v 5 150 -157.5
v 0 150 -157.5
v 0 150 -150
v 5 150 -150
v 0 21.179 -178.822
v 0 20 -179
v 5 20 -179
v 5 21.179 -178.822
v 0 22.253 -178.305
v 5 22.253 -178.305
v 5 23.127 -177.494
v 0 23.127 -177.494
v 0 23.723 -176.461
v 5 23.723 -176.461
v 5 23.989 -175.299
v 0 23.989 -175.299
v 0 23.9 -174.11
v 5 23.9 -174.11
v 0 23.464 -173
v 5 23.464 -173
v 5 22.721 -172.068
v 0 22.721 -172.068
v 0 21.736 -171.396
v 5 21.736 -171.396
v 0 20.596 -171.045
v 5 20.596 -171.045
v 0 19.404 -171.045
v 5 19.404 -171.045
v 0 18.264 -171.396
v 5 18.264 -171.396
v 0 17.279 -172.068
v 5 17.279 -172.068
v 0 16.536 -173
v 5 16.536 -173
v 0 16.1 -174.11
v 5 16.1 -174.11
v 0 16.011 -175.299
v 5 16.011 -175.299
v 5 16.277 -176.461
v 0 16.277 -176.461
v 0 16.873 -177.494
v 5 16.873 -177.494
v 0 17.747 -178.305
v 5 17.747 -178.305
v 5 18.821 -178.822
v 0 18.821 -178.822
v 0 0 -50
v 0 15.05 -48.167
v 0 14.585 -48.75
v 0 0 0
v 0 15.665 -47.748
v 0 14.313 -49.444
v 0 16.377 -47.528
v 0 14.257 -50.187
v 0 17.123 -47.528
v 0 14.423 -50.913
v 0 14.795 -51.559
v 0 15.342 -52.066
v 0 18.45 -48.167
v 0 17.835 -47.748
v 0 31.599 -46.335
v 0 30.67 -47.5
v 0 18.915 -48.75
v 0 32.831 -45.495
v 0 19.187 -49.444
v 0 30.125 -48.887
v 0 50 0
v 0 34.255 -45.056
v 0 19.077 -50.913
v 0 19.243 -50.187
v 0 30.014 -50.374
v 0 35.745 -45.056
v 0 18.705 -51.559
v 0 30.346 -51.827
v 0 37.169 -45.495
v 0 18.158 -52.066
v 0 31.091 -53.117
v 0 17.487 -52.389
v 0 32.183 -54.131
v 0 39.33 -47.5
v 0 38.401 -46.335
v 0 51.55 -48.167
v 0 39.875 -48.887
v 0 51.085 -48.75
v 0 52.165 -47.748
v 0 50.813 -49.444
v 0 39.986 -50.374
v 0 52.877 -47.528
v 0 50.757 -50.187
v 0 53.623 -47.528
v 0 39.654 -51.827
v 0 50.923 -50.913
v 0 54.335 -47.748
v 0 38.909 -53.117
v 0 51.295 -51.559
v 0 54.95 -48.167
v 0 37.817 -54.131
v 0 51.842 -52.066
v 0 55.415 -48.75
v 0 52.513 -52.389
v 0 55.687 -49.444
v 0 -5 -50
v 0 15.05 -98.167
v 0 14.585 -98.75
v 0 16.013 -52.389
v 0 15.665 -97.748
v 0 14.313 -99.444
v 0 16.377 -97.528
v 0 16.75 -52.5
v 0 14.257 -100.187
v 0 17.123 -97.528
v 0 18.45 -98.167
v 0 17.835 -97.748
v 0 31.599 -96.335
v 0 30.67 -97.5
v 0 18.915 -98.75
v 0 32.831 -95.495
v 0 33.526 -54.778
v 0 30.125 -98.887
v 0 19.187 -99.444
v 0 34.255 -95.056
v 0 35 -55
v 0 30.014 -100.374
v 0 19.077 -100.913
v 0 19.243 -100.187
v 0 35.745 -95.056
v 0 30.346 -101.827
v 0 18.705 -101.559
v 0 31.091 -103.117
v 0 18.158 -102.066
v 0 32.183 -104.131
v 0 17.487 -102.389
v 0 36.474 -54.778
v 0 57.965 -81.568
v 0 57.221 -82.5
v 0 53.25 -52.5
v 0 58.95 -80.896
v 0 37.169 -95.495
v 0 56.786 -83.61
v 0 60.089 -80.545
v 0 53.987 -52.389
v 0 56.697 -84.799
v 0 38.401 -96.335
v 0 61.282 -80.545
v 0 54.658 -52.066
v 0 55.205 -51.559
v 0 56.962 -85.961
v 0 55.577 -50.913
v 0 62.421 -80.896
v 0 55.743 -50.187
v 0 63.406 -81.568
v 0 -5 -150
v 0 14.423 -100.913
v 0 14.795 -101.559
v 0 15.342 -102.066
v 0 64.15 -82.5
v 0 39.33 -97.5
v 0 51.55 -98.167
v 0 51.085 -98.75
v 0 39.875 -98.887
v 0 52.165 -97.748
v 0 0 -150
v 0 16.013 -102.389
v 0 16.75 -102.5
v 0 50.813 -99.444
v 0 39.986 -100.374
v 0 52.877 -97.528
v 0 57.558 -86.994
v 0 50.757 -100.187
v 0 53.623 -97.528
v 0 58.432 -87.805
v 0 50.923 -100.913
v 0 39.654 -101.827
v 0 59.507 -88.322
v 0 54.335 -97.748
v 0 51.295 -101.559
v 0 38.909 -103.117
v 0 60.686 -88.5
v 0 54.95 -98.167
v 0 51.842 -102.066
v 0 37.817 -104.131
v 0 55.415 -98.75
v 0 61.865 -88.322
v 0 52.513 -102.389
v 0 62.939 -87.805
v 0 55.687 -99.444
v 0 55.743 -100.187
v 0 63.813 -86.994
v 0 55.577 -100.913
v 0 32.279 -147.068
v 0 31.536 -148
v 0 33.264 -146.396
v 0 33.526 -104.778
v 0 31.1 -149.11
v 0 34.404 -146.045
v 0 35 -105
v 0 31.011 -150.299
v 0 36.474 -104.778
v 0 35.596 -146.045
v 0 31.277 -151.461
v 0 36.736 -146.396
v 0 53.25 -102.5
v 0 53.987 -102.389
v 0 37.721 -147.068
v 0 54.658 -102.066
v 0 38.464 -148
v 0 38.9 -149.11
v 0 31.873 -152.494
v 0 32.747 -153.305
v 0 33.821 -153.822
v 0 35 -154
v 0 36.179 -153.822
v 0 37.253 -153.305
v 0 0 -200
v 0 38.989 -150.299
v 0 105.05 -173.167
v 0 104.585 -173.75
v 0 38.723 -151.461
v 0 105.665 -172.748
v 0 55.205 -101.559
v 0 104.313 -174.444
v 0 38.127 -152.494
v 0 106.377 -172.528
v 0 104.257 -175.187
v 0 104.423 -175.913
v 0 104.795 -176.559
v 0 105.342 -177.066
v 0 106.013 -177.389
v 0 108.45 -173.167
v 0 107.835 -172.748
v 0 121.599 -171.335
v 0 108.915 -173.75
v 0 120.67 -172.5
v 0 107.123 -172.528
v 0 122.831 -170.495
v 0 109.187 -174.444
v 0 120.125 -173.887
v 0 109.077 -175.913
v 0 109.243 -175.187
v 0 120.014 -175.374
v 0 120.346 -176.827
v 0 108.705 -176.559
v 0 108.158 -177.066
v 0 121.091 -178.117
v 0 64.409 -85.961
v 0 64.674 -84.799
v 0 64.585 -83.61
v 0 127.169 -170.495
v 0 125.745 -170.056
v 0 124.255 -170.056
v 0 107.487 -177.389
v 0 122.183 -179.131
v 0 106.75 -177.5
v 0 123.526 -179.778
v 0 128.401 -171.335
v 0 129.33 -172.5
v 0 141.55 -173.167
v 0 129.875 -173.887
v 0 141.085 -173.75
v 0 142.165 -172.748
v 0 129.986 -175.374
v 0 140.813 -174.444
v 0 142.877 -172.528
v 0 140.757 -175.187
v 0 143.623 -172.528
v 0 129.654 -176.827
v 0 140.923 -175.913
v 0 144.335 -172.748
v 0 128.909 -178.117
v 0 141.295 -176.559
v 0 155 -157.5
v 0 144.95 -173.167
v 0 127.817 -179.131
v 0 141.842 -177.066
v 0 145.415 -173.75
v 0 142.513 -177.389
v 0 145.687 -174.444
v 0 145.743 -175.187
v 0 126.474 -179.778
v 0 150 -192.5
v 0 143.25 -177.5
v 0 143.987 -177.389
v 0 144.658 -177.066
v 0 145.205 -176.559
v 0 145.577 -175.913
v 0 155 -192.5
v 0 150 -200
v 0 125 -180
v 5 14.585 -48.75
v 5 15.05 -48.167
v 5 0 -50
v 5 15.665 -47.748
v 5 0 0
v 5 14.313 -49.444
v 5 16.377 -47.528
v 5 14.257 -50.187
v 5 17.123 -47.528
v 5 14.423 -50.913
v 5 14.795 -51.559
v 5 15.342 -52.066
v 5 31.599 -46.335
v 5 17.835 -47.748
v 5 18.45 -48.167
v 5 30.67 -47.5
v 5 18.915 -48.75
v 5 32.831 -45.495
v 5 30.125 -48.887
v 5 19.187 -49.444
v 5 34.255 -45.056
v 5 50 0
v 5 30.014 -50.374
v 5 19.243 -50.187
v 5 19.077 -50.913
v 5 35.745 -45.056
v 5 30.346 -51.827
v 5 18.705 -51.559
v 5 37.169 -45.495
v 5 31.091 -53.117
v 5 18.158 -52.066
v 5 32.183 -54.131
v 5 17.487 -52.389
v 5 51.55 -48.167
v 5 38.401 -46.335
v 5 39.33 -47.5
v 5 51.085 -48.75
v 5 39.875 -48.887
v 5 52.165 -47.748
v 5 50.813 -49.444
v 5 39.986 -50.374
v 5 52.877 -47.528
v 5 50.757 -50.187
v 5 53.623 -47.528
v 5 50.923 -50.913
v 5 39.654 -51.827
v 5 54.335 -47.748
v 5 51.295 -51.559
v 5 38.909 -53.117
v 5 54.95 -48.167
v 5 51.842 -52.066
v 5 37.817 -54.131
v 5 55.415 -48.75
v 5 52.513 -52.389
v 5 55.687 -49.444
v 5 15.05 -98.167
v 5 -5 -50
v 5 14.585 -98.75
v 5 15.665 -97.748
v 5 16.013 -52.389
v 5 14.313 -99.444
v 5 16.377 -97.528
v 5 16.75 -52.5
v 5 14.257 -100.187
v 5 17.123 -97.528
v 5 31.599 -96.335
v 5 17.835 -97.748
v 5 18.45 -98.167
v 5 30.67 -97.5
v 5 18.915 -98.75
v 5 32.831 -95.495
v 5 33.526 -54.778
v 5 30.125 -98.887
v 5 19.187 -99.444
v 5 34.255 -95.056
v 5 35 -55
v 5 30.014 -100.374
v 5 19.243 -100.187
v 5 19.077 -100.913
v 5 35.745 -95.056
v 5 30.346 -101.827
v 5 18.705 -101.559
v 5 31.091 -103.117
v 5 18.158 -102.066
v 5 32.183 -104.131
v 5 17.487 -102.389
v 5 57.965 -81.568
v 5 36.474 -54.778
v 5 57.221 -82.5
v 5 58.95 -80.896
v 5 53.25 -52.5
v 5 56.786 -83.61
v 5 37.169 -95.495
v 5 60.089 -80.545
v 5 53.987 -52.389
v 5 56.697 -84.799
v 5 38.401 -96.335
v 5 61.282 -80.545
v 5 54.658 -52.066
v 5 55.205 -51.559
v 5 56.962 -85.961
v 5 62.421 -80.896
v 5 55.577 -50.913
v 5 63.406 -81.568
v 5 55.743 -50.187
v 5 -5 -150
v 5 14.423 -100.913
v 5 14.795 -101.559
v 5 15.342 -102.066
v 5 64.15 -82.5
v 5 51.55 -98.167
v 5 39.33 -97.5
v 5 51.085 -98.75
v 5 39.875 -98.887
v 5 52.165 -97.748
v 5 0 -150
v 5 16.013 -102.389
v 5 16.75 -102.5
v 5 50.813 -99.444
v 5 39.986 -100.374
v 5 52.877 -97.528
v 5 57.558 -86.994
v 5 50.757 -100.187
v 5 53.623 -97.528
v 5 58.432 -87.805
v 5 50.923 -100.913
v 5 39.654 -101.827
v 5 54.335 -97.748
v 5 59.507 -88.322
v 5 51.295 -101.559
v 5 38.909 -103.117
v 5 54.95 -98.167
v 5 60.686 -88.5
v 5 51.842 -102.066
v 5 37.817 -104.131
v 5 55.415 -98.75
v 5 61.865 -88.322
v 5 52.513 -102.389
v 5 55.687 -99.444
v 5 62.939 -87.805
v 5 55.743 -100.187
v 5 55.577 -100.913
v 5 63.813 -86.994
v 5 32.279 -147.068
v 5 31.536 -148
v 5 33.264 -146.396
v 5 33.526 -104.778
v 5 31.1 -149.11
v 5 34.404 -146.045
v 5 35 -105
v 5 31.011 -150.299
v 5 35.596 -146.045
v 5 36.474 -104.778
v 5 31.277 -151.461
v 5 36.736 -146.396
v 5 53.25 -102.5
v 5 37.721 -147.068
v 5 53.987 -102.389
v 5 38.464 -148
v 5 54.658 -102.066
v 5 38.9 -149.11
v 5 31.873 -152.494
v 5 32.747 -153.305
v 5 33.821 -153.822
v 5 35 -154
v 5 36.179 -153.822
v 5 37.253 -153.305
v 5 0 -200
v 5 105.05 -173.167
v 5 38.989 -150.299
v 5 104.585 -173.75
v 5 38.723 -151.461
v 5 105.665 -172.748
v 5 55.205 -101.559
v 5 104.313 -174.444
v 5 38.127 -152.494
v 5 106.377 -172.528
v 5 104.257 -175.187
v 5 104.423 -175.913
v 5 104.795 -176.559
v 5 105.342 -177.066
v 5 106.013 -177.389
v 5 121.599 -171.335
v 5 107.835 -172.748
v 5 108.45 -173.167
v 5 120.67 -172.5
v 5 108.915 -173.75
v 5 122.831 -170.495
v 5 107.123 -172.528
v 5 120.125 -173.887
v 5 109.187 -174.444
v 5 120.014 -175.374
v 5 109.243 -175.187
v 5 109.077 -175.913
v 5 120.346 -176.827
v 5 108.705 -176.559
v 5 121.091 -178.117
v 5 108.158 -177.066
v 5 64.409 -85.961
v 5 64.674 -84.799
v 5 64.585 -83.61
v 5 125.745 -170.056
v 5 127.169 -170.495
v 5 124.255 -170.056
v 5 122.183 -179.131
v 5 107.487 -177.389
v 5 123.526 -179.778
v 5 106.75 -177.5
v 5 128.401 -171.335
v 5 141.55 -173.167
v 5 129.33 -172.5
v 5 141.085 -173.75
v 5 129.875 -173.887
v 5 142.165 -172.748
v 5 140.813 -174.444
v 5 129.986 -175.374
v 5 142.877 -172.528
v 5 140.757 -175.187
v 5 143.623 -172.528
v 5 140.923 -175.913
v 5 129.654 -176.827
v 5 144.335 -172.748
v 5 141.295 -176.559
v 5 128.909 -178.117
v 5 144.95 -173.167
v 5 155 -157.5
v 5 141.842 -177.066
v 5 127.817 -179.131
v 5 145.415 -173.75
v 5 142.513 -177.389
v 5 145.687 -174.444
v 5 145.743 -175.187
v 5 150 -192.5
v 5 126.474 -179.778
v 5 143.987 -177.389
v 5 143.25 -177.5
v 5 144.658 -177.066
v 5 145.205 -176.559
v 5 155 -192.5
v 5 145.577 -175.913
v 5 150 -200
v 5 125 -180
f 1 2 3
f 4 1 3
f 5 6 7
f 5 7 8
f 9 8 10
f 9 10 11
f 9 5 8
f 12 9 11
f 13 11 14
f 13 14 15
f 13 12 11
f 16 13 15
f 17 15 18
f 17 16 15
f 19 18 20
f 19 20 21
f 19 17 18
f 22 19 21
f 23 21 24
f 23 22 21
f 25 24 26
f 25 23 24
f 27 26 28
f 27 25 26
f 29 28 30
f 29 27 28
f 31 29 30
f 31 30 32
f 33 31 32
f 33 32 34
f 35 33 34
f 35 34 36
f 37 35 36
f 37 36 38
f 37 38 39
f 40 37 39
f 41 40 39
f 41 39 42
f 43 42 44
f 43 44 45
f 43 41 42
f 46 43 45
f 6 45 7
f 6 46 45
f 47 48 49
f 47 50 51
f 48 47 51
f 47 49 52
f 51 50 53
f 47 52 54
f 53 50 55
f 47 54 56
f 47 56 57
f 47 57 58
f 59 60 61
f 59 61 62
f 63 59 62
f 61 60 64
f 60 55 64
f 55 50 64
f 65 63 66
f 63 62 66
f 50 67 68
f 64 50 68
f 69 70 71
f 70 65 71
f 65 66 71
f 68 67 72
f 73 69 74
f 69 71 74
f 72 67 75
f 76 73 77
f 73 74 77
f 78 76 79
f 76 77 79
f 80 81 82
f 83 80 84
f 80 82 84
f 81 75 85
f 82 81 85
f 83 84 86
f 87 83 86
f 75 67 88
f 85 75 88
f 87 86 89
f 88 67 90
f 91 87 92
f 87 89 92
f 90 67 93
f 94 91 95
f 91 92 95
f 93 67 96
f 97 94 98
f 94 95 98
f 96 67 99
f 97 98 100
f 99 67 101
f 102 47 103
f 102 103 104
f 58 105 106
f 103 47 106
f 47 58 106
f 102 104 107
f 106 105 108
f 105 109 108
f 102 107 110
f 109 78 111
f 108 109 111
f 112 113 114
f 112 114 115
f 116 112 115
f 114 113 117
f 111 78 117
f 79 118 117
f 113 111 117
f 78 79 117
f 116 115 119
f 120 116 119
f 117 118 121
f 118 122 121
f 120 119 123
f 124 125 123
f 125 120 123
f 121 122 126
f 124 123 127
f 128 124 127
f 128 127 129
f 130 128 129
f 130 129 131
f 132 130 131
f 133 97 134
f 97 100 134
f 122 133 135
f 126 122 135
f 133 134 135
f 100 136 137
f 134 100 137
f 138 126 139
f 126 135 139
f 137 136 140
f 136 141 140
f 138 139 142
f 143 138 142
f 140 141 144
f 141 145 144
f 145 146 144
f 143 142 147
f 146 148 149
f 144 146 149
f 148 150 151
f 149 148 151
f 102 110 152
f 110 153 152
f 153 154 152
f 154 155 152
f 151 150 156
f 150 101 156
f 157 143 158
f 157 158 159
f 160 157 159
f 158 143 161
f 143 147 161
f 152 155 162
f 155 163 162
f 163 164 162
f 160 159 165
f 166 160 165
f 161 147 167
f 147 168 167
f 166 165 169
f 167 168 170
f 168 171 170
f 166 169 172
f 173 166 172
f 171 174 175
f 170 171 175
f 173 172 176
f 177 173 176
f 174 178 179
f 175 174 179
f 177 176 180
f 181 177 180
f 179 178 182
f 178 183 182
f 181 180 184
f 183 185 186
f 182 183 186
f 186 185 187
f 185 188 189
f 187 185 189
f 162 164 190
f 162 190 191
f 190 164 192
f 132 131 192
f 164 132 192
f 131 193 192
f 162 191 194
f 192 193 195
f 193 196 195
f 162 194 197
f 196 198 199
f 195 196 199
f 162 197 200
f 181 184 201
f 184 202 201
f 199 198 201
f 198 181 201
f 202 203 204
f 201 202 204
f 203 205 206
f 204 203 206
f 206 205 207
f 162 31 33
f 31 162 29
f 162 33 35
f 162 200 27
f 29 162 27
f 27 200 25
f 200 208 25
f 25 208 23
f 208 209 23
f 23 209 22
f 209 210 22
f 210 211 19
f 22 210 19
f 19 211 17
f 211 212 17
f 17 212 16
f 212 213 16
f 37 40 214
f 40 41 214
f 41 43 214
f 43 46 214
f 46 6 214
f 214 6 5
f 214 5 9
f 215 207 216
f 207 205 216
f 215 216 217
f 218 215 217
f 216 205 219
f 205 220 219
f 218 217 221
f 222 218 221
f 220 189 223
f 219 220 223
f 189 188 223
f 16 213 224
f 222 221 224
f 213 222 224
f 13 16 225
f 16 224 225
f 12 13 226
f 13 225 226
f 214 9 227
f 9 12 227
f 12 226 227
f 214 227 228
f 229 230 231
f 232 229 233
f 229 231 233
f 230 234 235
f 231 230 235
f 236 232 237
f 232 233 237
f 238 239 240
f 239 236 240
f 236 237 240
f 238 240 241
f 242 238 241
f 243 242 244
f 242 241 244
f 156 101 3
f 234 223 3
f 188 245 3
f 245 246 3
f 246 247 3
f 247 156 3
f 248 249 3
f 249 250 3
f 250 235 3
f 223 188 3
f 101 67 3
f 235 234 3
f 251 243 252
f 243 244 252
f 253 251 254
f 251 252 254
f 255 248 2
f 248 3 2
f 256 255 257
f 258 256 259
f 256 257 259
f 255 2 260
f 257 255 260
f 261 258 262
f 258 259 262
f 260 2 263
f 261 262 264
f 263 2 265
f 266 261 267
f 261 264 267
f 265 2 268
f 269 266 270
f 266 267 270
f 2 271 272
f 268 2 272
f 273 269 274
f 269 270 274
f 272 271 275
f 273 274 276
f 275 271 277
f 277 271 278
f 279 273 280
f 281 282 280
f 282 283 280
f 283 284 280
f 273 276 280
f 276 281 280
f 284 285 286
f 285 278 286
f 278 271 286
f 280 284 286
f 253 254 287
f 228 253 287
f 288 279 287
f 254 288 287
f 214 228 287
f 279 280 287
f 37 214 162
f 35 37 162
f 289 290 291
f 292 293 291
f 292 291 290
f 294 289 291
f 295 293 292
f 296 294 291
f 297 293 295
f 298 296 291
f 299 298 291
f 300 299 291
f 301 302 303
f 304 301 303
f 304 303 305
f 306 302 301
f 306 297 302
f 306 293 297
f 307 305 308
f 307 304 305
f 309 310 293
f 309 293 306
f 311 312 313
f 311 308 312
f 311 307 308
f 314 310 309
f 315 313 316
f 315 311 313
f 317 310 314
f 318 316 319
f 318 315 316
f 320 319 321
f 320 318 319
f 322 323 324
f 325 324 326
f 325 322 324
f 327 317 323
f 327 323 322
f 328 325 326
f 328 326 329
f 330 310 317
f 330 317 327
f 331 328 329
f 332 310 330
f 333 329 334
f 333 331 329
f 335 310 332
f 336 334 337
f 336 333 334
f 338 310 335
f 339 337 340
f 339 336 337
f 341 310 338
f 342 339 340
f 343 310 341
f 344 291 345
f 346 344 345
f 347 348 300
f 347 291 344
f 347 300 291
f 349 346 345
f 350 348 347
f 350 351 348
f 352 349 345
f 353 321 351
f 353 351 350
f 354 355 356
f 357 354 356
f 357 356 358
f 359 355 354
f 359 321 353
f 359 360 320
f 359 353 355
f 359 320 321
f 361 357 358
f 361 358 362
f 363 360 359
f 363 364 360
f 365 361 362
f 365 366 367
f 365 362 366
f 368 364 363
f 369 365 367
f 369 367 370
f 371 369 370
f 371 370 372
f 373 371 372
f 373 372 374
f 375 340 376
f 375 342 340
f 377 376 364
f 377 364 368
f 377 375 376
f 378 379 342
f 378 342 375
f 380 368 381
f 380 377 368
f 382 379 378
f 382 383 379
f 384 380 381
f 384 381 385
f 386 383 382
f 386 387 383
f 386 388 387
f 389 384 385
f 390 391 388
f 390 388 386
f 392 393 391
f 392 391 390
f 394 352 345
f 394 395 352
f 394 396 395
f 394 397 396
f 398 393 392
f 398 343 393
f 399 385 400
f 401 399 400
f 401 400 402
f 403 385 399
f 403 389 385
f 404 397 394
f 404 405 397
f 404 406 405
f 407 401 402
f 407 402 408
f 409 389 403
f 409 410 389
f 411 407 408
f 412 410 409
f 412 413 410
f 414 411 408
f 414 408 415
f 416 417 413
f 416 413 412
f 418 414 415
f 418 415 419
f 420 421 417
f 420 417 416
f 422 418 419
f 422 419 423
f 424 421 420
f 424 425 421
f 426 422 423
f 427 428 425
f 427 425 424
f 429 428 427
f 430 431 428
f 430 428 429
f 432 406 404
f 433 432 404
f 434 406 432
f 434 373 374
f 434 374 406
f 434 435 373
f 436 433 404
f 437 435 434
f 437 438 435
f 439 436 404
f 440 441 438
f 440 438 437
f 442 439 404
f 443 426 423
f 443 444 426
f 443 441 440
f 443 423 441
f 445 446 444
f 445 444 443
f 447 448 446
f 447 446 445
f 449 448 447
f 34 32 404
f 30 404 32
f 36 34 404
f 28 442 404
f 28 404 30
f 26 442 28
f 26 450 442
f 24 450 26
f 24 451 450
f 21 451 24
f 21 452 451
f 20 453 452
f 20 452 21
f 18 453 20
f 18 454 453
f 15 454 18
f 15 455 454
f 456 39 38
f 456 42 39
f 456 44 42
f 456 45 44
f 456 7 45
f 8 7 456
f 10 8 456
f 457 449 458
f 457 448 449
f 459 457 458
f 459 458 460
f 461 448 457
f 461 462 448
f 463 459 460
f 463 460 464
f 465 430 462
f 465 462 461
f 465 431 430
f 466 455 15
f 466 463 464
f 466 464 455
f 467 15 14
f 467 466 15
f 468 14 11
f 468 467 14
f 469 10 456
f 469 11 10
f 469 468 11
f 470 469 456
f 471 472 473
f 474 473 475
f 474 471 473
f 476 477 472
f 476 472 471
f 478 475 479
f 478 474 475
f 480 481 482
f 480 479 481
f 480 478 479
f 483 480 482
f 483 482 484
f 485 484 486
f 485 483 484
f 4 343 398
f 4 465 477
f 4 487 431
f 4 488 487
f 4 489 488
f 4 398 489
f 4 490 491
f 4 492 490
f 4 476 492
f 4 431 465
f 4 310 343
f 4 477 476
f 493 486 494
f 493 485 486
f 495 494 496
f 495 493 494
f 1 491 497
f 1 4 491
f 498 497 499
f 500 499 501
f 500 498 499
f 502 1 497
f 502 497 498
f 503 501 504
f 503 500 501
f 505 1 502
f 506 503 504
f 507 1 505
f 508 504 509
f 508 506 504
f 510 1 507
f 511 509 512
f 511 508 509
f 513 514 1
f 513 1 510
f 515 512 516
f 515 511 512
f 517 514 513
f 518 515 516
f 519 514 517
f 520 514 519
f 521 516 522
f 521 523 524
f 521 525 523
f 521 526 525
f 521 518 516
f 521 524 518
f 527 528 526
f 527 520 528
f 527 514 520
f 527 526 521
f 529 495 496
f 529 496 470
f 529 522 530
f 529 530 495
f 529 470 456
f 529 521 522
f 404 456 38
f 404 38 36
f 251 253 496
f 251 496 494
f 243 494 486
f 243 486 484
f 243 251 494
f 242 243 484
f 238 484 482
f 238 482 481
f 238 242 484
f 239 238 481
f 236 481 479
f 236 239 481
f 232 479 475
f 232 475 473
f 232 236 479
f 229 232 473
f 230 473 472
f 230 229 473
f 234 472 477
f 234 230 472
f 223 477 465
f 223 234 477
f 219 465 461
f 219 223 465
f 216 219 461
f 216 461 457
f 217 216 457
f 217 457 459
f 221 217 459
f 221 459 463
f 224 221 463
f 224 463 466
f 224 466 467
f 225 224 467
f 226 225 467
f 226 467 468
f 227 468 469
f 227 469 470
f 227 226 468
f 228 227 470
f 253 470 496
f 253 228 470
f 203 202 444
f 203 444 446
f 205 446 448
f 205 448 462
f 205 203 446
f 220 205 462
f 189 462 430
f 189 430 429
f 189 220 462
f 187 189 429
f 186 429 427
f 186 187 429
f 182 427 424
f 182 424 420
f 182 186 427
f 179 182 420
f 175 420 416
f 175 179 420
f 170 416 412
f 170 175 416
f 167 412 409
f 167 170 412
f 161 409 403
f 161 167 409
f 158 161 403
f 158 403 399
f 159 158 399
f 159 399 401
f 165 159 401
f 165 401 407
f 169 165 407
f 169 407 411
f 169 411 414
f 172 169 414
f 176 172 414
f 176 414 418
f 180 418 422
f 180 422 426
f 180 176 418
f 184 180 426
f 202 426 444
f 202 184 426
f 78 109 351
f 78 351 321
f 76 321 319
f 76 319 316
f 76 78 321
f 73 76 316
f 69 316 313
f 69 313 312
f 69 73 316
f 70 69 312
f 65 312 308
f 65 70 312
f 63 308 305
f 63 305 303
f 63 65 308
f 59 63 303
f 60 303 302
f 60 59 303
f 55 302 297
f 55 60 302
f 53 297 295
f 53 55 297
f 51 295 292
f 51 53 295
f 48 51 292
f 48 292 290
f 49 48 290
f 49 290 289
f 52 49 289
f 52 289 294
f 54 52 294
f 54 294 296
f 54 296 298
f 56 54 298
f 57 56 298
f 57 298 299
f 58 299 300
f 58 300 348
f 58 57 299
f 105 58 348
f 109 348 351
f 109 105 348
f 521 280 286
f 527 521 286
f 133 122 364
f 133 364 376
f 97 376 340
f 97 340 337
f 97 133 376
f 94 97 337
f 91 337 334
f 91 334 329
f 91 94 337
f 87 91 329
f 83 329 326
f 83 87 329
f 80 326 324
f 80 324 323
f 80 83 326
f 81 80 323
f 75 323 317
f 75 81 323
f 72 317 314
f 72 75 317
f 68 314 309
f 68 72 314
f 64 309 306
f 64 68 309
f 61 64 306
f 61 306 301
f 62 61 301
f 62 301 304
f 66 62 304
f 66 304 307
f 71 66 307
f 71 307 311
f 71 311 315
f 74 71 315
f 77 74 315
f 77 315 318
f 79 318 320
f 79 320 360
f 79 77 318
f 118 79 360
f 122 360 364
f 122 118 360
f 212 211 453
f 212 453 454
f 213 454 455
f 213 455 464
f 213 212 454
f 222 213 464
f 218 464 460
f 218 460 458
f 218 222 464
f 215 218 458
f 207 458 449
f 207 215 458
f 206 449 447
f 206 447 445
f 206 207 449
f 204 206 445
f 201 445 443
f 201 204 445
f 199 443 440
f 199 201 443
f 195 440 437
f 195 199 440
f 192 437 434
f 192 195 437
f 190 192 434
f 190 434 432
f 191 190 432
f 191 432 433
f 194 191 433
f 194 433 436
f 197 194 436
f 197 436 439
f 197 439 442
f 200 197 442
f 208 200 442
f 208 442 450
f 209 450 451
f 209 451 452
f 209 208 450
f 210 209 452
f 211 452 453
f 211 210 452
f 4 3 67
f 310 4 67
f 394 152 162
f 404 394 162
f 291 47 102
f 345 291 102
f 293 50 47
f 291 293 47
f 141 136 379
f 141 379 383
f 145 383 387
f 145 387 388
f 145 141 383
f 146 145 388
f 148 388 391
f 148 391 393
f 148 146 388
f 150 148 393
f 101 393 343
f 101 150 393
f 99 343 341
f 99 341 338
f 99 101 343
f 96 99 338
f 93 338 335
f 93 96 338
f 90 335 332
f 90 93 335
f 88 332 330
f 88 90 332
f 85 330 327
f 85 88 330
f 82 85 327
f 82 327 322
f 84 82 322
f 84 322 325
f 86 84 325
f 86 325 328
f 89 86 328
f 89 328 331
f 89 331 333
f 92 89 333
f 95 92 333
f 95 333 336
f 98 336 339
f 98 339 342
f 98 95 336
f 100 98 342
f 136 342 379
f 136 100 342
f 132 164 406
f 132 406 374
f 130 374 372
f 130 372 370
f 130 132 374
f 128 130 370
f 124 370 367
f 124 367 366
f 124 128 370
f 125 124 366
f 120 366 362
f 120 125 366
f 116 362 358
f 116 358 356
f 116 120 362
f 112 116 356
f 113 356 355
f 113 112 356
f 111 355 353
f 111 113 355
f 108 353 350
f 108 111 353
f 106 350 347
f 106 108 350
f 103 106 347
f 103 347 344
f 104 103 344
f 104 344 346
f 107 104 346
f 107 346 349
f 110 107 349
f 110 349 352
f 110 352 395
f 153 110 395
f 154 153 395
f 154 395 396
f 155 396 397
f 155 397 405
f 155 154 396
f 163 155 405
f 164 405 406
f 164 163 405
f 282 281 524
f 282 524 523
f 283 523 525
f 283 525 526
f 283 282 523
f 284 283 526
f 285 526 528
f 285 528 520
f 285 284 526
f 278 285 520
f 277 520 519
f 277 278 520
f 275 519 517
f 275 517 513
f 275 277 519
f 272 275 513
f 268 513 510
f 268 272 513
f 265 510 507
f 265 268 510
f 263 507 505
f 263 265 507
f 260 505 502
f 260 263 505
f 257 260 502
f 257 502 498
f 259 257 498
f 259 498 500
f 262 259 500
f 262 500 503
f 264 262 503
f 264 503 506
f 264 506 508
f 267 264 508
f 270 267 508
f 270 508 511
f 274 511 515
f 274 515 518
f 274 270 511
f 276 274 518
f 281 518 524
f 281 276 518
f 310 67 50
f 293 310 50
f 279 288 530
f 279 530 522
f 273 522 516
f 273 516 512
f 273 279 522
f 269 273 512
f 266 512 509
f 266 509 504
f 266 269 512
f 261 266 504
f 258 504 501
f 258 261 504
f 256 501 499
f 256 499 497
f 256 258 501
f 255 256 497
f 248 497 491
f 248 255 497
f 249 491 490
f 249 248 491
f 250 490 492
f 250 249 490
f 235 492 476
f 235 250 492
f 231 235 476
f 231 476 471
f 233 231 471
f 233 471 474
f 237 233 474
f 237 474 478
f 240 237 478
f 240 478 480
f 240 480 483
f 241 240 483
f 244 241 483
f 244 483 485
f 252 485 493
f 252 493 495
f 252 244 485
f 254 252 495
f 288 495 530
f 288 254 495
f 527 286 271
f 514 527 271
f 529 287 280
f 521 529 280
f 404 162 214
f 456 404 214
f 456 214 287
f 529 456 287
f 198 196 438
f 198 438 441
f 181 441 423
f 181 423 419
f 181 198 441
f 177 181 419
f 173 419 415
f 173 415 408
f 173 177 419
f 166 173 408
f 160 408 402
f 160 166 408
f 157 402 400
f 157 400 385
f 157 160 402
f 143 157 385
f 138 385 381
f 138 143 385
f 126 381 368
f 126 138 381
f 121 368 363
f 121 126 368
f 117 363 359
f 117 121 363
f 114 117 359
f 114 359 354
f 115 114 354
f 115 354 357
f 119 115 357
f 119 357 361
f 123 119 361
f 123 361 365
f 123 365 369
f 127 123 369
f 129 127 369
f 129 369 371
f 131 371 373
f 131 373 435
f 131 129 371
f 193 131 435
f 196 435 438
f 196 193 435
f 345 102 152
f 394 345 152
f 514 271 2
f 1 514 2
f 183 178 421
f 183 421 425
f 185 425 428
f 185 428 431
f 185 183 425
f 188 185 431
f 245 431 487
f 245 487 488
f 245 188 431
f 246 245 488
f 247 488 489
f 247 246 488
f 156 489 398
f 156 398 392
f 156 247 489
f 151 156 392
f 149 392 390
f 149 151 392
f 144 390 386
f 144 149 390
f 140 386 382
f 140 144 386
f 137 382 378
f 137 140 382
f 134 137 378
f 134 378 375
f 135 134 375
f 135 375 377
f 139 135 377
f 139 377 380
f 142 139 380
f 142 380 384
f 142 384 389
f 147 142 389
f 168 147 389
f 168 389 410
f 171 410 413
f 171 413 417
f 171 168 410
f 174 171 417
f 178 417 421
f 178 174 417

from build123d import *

# Parameters (mm, degrees)
CROQUIS1_R              = 5
CROQUIS1_R_2            = 4
CROQUIS1_R_3            = 2.5
SALIENTE_EXTRUIR1_DEPTH = 5


with BuildPart() as part:
    # Croquis1 → Saliente-Extruir1 (new body)
    with BuildSketch(Plane(origin=(0, 0, 0), x_dir=(0, 0, -1), z_dir=(1, 0, 0))):
        Polygon((150, 150), (0, 50), (0, 0), (50, 0), (50, -5), (150, -5), (150, 0), (200, 0), (200, 150), (192.5, 150), (192.5, 155), (157.5, 155), (157.5, 150), align=None)
        with Locations((175, 125)):
            Circle(CROQUIS1_R, mode=Mode.SUBTRACT)
        with Locations((175, 20)):
            Circle(CROQUIS1_R_2, mode=Mode.SUBTRACT)
        with Locations((150, 35)):
            Circle(CROQUIS1_R_2, mode=Mode.SUBTRACT)
        with Locations((175, 143.25)):
            Circle(CROQUIS1_R_3, mode=Mode.SUBTRACT)
        with Locations((175, 106.75)):
            Circle(CROQUIS1_R_3, mode=Mode.SUBTRACT)
        with Locations((100, 35)):
            Circle(CROQUIS1_R, mode=Mode.SUBTRACT)
        with Locations((84.5, 60.685599078)):
            Circle(CROQUIS1_R_2, mode=Mode.SUBTRACT)
        with Locations((100, 53.25)):
            Circle(CROQUIS1_R_3, mode=Mode.SUBTRACT)
        with Locations((100, 16.75)):
            Circle(CROQUIS1_R_3, mode=Mode.SUBTRACT)
        with Locations((50, 35)):
            Circle(CROQUIS1_R, mode=Mode.SUBTRACT)
        with Locations((50, 53.25)):
            Circle(CROQUIS1_R_3, mode=Mode.SUBTRACT)
        with Locations((50, 16.75)):
            Circle(CROQUIS1_R_3, mode=Mode.SUBTRACT)
    extrude(amount=SALIENTE_EXTRUIR1_DEPTH)


solid = part.part
